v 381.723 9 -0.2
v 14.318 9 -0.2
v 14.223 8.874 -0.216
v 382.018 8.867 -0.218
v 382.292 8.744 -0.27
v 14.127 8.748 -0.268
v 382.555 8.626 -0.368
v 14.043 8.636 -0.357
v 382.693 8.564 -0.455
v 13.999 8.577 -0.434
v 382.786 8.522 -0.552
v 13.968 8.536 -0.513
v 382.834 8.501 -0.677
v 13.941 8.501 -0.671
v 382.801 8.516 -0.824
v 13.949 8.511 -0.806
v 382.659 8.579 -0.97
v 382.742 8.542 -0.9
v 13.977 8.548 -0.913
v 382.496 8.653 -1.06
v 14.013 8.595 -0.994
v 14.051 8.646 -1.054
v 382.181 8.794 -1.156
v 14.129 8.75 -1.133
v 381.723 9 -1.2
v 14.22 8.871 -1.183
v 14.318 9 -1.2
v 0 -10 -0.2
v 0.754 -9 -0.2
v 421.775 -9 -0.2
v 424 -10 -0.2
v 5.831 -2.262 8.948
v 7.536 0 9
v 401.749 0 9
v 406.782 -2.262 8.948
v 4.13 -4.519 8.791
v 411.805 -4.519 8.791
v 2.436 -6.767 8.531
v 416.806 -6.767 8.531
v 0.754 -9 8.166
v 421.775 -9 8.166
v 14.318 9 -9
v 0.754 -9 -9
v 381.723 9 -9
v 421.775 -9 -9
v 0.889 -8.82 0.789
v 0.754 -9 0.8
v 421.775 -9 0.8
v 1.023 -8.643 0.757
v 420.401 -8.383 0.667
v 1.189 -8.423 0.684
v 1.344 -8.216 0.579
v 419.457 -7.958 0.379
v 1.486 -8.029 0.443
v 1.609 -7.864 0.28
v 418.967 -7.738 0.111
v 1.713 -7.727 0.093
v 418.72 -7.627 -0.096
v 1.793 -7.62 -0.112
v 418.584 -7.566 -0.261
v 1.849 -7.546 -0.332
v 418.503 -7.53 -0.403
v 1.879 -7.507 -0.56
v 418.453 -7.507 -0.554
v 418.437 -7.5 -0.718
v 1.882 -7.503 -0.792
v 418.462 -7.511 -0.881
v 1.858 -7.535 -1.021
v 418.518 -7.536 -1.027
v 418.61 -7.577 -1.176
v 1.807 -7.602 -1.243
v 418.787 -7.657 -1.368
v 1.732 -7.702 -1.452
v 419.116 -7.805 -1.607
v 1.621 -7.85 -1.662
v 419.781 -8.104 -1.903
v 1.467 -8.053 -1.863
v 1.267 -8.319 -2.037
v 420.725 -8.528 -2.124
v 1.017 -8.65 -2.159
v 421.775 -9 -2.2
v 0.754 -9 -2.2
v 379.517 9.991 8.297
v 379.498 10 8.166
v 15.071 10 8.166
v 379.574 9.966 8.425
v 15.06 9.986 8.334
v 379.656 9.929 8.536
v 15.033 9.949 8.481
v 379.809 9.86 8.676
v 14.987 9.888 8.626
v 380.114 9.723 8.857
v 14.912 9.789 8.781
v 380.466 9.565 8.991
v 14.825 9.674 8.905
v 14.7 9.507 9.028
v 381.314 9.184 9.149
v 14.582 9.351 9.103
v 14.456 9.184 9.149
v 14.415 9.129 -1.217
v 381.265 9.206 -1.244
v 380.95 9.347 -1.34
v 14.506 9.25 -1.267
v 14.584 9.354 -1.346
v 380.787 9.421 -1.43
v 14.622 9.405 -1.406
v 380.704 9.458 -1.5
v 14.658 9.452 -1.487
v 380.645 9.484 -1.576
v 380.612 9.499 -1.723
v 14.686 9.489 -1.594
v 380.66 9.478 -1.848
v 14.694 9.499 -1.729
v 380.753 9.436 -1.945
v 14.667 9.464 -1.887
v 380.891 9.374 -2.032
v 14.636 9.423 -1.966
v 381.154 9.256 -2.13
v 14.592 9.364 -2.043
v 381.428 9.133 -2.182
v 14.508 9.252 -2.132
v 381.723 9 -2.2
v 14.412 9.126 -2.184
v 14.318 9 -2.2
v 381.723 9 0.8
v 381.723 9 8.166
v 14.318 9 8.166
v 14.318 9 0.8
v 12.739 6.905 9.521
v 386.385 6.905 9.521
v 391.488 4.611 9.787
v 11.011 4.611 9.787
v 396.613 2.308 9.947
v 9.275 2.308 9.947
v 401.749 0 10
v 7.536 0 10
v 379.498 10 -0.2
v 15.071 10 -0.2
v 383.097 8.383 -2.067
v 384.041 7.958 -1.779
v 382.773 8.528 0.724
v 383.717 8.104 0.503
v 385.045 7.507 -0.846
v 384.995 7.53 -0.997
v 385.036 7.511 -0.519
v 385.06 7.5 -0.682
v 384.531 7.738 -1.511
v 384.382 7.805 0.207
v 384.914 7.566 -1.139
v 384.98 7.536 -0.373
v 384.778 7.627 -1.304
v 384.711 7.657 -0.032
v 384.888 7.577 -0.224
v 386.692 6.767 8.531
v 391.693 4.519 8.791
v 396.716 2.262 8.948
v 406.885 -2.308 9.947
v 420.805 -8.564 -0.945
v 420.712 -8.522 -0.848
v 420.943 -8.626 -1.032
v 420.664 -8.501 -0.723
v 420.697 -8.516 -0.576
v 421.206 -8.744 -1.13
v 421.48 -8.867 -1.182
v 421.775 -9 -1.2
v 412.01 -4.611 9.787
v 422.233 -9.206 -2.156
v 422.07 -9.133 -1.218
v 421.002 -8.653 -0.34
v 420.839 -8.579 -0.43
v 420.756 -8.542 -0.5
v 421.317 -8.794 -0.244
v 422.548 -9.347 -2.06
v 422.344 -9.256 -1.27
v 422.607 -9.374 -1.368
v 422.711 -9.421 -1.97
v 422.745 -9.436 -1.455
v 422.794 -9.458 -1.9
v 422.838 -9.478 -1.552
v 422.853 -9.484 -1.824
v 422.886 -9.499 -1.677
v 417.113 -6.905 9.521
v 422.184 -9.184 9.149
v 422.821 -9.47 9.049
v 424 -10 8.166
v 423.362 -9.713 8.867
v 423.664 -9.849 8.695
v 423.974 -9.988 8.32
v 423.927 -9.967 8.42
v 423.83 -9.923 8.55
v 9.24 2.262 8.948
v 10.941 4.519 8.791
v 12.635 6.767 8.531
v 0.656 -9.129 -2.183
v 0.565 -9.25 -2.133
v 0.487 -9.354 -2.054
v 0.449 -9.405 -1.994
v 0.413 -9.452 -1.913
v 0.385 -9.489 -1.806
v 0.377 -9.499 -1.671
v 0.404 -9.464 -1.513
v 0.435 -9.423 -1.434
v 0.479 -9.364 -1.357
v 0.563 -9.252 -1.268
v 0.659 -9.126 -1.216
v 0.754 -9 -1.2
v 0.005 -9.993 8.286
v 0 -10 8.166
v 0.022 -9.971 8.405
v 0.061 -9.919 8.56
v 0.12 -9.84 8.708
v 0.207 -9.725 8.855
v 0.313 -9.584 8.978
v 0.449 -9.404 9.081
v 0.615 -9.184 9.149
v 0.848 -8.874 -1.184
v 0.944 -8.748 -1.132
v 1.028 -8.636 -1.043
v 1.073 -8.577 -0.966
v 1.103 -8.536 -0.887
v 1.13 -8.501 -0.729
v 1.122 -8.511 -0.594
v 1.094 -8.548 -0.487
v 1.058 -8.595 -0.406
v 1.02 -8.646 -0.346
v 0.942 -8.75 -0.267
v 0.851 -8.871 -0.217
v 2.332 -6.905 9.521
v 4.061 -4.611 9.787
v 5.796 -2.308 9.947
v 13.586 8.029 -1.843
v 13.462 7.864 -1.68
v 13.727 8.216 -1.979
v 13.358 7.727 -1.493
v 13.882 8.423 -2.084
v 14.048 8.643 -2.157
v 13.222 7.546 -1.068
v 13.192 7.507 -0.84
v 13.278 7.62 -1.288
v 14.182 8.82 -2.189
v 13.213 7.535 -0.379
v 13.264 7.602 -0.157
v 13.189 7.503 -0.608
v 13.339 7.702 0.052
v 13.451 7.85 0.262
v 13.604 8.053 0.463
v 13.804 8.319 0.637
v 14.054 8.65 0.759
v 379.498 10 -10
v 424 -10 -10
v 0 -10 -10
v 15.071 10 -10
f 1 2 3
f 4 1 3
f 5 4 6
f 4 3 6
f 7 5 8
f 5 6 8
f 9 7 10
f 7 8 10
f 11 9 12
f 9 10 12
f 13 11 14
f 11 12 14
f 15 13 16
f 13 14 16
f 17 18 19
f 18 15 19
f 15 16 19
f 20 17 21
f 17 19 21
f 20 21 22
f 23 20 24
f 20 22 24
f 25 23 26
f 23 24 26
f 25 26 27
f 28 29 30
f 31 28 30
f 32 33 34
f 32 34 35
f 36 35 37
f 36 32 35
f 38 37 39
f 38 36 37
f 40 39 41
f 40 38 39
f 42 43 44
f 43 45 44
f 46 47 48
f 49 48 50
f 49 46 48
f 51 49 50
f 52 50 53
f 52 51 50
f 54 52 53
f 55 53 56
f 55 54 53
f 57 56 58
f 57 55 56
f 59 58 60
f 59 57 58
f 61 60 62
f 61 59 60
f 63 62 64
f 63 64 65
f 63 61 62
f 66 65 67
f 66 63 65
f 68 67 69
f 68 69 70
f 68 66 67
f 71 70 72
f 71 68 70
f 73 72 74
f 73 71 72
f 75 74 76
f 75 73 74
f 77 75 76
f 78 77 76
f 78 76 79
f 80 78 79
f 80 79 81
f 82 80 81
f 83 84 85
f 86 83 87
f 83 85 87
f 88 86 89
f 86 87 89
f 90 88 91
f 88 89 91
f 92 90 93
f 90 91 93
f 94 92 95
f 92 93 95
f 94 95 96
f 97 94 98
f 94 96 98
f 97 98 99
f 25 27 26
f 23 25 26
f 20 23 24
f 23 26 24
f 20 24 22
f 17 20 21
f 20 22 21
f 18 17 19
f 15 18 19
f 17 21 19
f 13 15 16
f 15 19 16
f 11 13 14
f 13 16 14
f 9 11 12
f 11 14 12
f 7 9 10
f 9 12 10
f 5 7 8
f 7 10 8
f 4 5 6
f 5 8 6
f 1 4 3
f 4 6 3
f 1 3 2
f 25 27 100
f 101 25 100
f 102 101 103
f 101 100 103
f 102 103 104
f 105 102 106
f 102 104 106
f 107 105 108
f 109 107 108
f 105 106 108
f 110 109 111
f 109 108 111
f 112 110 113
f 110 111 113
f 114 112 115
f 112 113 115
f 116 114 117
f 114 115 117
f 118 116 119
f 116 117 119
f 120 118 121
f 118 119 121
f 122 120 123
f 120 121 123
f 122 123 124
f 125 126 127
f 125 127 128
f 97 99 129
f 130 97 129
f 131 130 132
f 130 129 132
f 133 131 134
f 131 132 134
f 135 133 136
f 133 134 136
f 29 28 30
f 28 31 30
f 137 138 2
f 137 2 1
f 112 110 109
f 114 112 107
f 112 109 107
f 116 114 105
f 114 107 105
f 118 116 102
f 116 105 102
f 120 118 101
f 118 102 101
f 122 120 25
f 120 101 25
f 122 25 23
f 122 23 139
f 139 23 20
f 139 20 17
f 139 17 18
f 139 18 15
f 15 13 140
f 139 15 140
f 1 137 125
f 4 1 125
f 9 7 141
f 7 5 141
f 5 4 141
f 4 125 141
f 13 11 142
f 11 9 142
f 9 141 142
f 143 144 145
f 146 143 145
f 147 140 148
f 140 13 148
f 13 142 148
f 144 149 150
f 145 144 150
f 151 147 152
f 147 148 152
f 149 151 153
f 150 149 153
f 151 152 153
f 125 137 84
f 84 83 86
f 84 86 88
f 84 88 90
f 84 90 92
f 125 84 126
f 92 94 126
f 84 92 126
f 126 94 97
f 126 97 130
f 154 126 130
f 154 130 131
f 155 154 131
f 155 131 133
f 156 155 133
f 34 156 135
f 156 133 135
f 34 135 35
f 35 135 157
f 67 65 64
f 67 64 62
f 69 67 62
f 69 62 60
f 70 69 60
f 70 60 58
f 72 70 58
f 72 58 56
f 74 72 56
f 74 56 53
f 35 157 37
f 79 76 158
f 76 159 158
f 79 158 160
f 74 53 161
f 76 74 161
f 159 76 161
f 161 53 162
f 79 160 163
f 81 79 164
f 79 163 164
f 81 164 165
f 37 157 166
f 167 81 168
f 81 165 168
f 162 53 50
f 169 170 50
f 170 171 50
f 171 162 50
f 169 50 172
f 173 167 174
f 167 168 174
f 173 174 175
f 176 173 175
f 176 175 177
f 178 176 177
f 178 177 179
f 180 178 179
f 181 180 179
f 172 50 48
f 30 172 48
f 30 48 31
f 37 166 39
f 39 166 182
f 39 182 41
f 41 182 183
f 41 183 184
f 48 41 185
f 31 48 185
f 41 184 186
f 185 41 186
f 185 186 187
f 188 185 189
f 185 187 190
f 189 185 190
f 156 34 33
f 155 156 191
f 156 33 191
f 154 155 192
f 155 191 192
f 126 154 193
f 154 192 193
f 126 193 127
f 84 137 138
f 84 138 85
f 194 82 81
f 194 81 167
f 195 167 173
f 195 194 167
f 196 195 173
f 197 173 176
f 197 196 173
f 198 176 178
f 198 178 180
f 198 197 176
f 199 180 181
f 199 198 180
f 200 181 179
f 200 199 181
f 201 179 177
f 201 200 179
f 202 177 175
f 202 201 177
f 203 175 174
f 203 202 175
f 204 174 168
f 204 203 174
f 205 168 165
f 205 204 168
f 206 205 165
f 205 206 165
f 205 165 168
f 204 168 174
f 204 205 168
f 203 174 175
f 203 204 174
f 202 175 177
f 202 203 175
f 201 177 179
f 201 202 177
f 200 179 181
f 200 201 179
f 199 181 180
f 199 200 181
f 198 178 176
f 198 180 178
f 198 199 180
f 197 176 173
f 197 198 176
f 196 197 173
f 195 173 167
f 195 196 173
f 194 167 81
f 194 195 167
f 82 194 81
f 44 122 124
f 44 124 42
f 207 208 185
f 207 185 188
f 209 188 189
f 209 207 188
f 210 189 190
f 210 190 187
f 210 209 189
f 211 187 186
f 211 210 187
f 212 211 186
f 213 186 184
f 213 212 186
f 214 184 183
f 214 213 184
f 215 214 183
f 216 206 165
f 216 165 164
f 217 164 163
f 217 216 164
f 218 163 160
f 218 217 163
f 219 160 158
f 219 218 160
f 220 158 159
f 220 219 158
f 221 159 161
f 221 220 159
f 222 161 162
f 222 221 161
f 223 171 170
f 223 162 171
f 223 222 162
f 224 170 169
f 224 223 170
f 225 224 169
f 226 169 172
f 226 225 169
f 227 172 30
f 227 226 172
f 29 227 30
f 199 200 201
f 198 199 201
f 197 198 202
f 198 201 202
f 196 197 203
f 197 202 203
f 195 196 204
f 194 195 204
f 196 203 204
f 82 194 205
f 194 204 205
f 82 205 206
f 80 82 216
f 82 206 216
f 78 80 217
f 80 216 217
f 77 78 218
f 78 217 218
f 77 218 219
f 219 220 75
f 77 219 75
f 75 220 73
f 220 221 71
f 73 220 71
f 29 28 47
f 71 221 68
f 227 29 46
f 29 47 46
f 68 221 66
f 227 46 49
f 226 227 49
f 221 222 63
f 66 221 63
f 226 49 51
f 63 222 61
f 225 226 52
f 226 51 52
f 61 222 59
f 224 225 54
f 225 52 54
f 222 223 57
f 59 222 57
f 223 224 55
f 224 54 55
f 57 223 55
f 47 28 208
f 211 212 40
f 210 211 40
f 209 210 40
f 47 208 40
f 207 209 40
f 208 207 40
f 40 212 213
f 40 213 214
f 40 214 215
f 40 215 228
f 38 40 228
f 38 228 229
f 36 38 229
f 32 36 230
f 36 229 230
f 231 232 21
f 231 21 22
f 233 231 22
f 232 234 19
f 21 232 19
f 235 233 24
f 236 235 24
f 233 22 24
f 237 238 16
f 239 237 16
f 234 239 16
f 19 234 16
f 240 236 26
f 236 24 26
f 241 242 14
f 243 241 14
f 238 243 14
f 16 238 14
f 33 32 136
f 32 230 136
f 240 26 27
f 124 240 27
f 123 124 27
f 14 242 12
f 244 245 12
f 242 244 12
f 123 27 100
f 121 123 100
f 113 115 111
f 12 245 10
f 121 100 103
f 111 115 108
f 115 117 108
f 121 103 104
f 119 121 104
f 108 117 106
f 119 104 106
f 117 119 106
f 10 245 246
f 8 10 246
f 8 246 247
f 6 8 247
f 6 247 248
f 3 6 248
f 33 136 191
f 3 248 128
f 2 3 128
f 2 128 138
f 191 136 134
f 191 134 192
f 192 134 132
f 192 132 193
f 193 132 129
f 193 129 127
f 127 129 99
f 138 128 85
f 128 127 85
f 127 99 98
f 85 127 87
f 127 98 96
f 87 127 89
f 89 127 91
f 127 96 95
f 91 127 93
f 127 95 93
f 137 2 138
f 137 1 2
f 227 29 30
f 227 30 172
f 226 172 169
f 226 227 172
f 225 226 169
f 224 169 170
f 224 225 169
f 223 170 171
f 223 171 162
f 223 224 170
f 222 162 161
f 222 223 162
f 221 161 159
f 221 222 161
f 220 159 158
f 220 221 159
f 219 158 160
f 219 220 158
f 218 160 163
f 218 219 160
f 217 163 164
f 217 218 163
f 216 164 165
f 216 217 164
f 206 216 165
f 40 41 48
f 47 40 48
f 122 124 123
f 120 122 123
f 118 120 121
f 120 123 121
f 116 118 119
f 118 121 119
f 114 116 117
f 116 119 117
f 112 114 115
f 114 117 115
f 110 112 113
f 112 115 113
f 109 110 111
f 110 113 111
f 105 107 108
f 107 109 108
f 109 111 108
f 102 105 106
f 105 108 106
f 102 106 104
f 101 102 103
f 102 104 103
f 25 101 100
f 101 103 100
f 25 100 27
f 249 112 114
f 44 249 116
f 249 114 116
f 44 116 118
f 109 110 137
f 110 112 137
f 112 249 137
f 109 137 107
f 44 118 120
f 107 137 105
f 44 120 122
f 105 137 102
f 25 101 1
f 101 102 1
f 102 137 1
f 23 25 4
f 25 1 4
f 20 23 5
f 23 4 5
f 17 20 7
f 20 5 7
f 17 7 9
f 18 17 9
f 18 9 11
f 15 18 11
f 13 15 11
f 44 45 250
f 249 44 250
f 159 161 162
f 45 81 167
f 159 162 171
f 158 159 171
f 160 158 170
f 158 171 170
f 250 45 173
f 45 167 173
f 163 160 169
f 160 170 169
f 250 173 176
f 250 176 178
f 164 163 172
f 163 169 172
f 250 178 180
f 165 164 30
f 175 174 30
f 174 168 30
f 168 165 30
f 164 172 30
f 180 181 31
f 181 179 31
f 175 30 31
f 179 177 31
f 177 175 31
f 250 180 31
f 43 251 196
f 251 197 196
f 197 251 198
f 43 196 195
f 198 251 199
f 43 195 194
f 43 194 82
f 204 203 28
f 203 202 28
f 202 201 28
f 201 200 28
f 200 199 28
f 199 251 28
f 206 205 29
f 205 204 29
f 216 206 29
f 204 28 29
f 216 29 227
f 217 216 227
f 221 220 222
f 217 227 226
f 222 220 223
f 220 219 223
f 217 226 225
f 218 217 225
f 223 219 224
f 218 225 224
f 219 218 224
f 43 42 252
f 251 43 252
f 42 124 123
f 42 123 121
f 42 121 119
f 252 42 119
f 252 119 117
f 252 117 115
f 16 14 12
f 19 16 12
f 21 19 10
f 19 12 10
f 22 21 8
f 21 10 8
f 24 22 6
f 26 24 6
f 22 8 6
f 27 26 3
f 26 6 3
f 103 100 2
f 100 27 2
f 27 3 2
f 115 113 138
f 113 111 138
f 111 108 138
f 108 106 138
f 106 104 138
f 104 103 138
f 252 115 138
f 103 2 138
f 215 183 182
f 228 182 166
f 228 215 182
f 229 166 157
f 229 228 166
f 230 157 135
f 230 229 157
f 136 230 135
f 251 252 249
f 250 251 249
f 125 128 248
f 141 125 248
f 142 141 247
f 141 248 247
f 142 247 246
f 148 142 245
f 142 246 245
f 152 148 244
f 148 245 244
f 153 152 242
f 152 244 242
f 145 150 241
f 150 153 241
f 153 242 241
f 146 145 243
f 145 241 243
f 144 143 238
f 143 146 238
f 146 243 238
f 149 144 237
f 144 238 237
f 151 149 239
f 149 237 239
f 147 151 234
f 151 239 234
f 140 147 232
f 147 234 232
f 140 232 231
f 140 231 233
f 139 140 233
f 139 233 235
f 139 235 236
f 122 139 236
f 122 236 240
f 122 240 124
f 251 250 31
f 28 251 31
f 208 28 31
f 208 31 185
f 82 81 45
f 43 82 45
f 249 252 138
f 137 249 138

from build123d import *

# Parameters (mm, degrees)
F2_DEPTH      = 1000
F4_DEPTH      = 1000
F8_DEPTH      = 10.001
F8_DEPTH_BACK = 10.001


with BuildPart() as f2:
    # F1 (on Right) → F2 (new body)
    with BuildSketch(Plane.YZ):
        with BuildLine():
            Line((0, -9), (0, -10))
            Line((0, -10), (10, -10))
            Line((10, -10), (10, -0.2))
            Line((10, -0.2), (9, -0.2))
            ThreePointArc((9, -0.2), (8.5, -0.7), (9, -1.2))
            ThreePointArc((9, -1.2), (9.5, -1.7), (9, -2.2))
            Line((9, -2.2), (9, -9))
            Line((9, -9), (0, -9))
        make_face()
    extrude(amount=F2_DEPTH)

    # F5: F2 across plane


with BuildPart() as f4:
    # F3 (on Right) → F4 (new body)
    with BuildSketch(Plane.YZ):
        with BuildLine():
            Line((9, -0.2), (10, -0.2))
            Line((10, -0.2), (10, 8.1663783152))
            ThreePointArc((10, 8.1663783152), (9.7693092582, 8.8052548802), (9.1836734694, 9.1493656277))
            ThreePointArc((9.1836734694, 9.1493656277), (4.6114920912, 9.7868872364), (0, 10))
            Line((0, 10), (0, 9))
            ThreePointArc((0, 9), (4.5192622493, 8.7911494917), (9, 8.1663783152))
            Line((9, 8.1663783152), (9, 0.8))
            ThreePointArc((9, 0.8), (7.5, -0.7), (9, -2.2))
            ThreePointArc((9, -2.2), (9.5, -1.7), (9, -1.2))
            ThreePointArc((9, -1.2), (8.5, -0.7), (9, -0.2))
        make_face()
    extrude(amount=F4_DEPTH)

    # F6: F4 across plane


with BuildPart() as f2_1:
    add(f2.part)
    add(f2.part.mirror(Plane.XZ))


with BuildPart() as f4_1:
    add(f4.part)
    add(f4.part.mirror(Plane.XZ))


with BuildPart() as f8_tool:
    # F7 (on Top) → F8 (new body, two sides)
    with BuildSketch(Plane.XY) as f8_sk:
        Polygon((0, 10), (0, 0), (0, -10), (15.0710810021, 10), align=None)
        Polygon((379.4979817736, 10), (424, -10), (1016.9613361359, -10), (1016.9613361359, 10), (709.9114181152, 10), (424, 10), align=None)
    extrude(amount=F8_DEPTH)
    extrude(f8_sk.sketch, amount=-F8_DEPTH_BACK)


with BuildPart() as f2_2:
    add(f2_1.part)

    # F8: cut by f8_tool
    add(f8_tool.part, mode=Mode.SUBTRACT)


with BuildPart() as f4_2:
    add(f4_1.part)

    # F8: cut by f8_tool
    add(f8_tool.part, mode=Mode.SUBTRACT)


solid = Compound([f2_2.part, f4_2.part])
